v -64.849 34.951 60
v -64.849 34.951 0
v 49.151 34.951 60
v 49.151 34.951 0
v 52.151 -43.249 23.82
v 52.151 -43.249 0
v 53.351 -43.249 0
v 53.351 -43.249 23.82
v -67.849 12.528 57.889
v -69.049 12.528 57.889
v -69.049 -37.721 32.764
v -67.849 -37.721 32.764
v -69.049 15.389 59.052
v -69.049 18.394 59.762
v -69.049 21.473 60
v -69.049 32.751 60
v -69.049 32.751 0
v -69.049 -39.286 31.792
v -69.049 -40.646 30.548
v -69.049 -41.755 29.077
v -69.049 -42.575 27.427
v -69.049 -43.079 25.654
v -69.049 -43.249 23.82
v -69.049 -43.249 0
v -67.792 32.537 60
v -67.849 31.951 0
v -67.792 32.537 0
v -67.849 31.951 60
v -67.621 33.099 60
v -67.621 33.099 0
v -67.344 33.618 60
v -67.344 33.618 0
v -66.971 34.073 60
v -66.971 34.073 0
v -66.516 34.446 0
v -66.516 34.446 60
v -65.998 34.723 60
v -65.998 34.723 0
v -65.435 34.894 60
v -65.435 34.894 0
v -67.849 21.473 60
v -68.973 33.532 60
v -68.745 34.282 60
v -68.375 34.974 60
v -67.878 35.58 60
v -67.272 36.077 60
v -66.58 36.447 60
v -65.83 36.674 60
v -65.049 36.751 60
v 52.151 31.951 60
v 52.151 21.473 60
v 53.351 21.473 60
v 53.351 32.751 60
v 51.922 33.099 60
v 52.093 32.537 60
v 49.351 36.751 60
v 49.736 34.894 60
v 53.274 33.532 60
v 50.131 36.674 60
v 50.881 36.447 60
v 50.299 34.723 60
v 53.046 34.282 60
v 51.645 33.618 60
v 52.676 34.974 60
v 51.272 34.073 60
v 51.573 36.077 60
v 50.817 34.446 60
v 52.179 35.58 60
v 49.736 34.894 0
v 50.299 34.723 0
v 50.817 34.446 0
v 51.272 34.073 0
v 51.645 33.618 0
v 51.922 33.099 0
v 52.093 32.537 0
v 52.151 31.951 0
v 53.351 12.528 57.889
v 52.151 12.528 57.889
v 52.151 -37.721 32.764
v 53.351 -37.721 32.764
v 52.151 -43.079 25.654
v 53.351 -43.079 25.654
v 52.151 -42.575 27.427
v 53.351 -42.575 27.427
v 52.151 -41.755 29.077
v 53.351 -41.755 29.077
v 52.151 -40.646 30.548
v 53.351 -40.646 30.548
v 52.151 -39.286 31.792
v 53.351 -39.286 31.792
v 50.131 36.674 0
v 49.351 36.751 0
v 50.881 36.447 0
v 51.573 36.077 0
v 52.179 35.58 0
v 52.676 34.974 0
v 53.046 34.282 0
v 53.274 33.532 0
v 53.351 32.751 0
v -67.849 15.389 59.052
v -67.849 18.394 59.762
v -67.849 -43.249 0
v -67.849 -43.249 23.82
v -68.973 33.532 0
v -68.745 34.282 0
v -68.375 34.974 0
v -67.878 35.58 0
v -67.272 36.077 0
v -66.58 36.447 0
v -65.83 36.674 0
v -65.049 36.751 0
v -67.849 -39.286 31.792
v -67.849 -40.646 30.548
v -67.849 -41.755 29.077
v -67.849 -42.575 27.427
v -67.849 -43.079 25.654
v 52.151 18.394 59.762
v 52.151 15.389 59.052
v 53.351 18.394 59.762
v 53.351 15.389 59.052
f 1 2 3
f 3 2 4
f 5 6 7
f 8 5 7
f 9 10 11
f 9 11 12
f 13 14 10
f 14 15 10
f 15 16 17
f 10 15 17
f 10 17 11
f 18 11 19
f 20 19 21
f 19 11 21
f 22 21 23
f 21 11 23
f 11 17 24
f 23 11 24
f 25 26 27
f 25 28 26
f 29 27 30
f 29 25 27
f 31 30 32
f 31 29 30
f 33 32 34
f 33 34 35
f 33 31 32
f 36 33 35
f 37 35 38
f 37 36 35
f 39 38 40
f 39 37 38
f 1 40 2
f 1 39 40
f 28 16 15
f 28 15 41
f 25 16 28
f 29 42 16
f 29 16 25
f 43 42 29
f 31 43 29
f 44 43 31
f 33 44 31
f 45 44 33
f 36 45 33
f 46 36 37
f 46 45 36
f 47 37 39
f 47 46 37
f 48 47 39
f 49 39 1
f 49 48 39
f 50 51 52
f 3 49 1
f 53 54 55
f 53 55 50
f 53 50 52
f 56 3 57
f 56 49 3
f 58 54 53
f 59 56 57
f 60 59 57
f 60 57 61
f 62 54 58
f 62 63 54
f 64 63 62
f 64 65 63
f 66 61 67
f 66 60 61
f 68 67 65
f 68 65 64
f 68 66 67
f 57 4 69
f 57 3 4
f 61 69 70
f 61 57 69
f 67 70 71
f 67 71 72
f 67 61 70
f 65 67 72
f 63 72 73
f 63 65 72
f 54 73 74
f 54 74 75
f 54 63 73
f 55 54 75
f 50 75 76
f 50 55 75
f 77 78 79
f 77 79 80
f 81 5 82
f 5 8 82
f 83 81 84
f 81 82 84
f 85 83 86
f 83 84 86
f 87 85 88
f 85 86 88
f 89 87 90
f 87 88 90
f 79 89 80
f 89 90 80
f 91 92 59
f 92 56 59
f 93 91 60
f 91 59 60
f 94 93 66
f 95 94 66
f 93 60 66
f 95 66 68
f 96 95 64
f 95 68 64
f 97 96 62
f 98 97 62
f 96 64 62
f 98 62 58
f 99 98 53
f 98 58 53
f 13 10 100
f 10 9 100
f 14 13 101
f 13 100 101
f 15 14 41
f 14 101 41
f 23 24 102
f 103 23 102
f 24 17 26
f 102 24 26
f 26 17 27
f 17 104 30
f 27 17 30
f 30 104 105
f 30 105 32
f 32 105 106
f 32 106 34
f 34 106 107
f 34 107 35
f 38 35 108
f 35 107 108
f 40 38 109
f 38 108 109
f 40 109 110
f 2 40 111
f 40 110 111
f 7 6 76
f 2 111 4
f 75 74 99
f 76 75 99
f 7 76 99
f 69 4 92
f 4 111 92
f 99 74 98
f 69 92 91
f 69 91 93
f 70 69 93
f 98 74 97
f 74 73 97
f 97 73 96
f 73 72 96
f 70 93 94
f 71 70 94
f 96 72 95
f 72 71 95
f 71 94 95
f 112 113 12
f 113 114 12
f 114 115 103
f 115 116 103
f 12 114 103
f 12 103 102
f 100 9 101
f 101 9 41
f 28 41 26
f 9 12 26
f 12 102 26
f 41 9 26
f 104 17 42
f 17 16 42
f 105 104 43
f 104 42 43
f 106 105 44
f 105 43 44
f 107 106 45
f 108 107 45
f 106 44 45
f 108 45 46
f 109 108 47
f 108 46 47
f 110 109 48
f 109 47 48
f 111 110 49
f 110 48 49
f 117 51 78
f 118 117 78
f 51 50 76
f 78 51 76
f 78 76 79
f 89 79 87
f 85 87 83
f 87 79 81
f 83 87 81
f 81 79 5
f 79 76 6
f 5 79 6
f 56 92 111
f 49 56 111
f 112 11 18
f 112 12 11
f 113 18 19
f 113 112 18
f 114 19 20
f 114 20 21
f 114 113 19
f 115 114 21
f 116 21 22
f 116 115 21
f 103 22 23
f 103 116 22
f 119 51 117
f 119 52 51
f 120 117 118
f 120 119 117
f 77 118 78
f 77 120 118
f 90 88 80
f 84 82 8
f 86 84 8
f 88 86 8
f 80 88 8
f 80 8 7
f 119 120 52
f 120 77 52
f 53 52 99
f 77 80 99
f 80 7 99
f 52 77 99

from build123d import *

# Parameters (mm, degrees)
F1_DEPTH = 60
F2_SIZE2 = 30
F2_SIZE  = 60
F3_R     = 20
F4_R     = 10
F5_R     = 3
F6_R     = 4


with BuildPart() as f1:
    # F0 (on Top) → F1 (new body)
    with BuildSketch(Plane.XY):
        Polygon((-69.0494580577, 36.7513514241), (-69.0494580577, -43.2486485759), (-67.8494580577, -43.2486485759), (-67.8494580577, 34.9513514241), (52.1505419423, 34.9513514241), (52.1505419423, -43.2486485759), (53.3505419423, -43.2486485759), (53.3505419423, 36.7513514241), align=None)
    extrude(amount=F1_DEPTH)

    # F2
    f2_edges = [f1.edges().sort_by_distance(p)[0] for p in [
        (-68.449458, -43.248649, 60),
        (52.750542, -43.248649, 60),
    ]]
    f2_side = f1.faces().sort_by_distance((-68.903233, -3.248649, 60))[0]
    chamfer(f2_edges, length=F2_SIZE, length2=F2_SIZE2, reference=f2_side)

    # F3
    f3_edges = [f1.edges().sort_by_distance(p)[0] for p in [
        (-68.449458, 16.751351, 60),
        (52.750542, 16.751351, 60),
    ]]
    fillet(f3_edges, radius=F3_R)

    # F4
    f4_edges = [f1.edges().sort_by_distance(p)[0] for p in [
        (-68.449458, -43.248649, 30),
        (52.750542, -43.248649, 30),
    ]]
    fillet(f4_edges, radius=F4_R)

    # F5
    f5_edges = [f1.edges().sort_by_distance(p)[0] for p in [
        (-67.849458, 34.951351, 30),
        (52.150542, 34.951351, 30),
    ]]
    fillet(f5_edges, radius=F5_R)

    # F6
    f6_edges = [f1.edges().sort_by_distance(p)[0] for p in [
        (53.350542, 36.751351, 30),
        (-69.049458, 36.751351, 30),
    ]]
    fillet(f6_edges, radius=F6_R)


solid = f1.part
